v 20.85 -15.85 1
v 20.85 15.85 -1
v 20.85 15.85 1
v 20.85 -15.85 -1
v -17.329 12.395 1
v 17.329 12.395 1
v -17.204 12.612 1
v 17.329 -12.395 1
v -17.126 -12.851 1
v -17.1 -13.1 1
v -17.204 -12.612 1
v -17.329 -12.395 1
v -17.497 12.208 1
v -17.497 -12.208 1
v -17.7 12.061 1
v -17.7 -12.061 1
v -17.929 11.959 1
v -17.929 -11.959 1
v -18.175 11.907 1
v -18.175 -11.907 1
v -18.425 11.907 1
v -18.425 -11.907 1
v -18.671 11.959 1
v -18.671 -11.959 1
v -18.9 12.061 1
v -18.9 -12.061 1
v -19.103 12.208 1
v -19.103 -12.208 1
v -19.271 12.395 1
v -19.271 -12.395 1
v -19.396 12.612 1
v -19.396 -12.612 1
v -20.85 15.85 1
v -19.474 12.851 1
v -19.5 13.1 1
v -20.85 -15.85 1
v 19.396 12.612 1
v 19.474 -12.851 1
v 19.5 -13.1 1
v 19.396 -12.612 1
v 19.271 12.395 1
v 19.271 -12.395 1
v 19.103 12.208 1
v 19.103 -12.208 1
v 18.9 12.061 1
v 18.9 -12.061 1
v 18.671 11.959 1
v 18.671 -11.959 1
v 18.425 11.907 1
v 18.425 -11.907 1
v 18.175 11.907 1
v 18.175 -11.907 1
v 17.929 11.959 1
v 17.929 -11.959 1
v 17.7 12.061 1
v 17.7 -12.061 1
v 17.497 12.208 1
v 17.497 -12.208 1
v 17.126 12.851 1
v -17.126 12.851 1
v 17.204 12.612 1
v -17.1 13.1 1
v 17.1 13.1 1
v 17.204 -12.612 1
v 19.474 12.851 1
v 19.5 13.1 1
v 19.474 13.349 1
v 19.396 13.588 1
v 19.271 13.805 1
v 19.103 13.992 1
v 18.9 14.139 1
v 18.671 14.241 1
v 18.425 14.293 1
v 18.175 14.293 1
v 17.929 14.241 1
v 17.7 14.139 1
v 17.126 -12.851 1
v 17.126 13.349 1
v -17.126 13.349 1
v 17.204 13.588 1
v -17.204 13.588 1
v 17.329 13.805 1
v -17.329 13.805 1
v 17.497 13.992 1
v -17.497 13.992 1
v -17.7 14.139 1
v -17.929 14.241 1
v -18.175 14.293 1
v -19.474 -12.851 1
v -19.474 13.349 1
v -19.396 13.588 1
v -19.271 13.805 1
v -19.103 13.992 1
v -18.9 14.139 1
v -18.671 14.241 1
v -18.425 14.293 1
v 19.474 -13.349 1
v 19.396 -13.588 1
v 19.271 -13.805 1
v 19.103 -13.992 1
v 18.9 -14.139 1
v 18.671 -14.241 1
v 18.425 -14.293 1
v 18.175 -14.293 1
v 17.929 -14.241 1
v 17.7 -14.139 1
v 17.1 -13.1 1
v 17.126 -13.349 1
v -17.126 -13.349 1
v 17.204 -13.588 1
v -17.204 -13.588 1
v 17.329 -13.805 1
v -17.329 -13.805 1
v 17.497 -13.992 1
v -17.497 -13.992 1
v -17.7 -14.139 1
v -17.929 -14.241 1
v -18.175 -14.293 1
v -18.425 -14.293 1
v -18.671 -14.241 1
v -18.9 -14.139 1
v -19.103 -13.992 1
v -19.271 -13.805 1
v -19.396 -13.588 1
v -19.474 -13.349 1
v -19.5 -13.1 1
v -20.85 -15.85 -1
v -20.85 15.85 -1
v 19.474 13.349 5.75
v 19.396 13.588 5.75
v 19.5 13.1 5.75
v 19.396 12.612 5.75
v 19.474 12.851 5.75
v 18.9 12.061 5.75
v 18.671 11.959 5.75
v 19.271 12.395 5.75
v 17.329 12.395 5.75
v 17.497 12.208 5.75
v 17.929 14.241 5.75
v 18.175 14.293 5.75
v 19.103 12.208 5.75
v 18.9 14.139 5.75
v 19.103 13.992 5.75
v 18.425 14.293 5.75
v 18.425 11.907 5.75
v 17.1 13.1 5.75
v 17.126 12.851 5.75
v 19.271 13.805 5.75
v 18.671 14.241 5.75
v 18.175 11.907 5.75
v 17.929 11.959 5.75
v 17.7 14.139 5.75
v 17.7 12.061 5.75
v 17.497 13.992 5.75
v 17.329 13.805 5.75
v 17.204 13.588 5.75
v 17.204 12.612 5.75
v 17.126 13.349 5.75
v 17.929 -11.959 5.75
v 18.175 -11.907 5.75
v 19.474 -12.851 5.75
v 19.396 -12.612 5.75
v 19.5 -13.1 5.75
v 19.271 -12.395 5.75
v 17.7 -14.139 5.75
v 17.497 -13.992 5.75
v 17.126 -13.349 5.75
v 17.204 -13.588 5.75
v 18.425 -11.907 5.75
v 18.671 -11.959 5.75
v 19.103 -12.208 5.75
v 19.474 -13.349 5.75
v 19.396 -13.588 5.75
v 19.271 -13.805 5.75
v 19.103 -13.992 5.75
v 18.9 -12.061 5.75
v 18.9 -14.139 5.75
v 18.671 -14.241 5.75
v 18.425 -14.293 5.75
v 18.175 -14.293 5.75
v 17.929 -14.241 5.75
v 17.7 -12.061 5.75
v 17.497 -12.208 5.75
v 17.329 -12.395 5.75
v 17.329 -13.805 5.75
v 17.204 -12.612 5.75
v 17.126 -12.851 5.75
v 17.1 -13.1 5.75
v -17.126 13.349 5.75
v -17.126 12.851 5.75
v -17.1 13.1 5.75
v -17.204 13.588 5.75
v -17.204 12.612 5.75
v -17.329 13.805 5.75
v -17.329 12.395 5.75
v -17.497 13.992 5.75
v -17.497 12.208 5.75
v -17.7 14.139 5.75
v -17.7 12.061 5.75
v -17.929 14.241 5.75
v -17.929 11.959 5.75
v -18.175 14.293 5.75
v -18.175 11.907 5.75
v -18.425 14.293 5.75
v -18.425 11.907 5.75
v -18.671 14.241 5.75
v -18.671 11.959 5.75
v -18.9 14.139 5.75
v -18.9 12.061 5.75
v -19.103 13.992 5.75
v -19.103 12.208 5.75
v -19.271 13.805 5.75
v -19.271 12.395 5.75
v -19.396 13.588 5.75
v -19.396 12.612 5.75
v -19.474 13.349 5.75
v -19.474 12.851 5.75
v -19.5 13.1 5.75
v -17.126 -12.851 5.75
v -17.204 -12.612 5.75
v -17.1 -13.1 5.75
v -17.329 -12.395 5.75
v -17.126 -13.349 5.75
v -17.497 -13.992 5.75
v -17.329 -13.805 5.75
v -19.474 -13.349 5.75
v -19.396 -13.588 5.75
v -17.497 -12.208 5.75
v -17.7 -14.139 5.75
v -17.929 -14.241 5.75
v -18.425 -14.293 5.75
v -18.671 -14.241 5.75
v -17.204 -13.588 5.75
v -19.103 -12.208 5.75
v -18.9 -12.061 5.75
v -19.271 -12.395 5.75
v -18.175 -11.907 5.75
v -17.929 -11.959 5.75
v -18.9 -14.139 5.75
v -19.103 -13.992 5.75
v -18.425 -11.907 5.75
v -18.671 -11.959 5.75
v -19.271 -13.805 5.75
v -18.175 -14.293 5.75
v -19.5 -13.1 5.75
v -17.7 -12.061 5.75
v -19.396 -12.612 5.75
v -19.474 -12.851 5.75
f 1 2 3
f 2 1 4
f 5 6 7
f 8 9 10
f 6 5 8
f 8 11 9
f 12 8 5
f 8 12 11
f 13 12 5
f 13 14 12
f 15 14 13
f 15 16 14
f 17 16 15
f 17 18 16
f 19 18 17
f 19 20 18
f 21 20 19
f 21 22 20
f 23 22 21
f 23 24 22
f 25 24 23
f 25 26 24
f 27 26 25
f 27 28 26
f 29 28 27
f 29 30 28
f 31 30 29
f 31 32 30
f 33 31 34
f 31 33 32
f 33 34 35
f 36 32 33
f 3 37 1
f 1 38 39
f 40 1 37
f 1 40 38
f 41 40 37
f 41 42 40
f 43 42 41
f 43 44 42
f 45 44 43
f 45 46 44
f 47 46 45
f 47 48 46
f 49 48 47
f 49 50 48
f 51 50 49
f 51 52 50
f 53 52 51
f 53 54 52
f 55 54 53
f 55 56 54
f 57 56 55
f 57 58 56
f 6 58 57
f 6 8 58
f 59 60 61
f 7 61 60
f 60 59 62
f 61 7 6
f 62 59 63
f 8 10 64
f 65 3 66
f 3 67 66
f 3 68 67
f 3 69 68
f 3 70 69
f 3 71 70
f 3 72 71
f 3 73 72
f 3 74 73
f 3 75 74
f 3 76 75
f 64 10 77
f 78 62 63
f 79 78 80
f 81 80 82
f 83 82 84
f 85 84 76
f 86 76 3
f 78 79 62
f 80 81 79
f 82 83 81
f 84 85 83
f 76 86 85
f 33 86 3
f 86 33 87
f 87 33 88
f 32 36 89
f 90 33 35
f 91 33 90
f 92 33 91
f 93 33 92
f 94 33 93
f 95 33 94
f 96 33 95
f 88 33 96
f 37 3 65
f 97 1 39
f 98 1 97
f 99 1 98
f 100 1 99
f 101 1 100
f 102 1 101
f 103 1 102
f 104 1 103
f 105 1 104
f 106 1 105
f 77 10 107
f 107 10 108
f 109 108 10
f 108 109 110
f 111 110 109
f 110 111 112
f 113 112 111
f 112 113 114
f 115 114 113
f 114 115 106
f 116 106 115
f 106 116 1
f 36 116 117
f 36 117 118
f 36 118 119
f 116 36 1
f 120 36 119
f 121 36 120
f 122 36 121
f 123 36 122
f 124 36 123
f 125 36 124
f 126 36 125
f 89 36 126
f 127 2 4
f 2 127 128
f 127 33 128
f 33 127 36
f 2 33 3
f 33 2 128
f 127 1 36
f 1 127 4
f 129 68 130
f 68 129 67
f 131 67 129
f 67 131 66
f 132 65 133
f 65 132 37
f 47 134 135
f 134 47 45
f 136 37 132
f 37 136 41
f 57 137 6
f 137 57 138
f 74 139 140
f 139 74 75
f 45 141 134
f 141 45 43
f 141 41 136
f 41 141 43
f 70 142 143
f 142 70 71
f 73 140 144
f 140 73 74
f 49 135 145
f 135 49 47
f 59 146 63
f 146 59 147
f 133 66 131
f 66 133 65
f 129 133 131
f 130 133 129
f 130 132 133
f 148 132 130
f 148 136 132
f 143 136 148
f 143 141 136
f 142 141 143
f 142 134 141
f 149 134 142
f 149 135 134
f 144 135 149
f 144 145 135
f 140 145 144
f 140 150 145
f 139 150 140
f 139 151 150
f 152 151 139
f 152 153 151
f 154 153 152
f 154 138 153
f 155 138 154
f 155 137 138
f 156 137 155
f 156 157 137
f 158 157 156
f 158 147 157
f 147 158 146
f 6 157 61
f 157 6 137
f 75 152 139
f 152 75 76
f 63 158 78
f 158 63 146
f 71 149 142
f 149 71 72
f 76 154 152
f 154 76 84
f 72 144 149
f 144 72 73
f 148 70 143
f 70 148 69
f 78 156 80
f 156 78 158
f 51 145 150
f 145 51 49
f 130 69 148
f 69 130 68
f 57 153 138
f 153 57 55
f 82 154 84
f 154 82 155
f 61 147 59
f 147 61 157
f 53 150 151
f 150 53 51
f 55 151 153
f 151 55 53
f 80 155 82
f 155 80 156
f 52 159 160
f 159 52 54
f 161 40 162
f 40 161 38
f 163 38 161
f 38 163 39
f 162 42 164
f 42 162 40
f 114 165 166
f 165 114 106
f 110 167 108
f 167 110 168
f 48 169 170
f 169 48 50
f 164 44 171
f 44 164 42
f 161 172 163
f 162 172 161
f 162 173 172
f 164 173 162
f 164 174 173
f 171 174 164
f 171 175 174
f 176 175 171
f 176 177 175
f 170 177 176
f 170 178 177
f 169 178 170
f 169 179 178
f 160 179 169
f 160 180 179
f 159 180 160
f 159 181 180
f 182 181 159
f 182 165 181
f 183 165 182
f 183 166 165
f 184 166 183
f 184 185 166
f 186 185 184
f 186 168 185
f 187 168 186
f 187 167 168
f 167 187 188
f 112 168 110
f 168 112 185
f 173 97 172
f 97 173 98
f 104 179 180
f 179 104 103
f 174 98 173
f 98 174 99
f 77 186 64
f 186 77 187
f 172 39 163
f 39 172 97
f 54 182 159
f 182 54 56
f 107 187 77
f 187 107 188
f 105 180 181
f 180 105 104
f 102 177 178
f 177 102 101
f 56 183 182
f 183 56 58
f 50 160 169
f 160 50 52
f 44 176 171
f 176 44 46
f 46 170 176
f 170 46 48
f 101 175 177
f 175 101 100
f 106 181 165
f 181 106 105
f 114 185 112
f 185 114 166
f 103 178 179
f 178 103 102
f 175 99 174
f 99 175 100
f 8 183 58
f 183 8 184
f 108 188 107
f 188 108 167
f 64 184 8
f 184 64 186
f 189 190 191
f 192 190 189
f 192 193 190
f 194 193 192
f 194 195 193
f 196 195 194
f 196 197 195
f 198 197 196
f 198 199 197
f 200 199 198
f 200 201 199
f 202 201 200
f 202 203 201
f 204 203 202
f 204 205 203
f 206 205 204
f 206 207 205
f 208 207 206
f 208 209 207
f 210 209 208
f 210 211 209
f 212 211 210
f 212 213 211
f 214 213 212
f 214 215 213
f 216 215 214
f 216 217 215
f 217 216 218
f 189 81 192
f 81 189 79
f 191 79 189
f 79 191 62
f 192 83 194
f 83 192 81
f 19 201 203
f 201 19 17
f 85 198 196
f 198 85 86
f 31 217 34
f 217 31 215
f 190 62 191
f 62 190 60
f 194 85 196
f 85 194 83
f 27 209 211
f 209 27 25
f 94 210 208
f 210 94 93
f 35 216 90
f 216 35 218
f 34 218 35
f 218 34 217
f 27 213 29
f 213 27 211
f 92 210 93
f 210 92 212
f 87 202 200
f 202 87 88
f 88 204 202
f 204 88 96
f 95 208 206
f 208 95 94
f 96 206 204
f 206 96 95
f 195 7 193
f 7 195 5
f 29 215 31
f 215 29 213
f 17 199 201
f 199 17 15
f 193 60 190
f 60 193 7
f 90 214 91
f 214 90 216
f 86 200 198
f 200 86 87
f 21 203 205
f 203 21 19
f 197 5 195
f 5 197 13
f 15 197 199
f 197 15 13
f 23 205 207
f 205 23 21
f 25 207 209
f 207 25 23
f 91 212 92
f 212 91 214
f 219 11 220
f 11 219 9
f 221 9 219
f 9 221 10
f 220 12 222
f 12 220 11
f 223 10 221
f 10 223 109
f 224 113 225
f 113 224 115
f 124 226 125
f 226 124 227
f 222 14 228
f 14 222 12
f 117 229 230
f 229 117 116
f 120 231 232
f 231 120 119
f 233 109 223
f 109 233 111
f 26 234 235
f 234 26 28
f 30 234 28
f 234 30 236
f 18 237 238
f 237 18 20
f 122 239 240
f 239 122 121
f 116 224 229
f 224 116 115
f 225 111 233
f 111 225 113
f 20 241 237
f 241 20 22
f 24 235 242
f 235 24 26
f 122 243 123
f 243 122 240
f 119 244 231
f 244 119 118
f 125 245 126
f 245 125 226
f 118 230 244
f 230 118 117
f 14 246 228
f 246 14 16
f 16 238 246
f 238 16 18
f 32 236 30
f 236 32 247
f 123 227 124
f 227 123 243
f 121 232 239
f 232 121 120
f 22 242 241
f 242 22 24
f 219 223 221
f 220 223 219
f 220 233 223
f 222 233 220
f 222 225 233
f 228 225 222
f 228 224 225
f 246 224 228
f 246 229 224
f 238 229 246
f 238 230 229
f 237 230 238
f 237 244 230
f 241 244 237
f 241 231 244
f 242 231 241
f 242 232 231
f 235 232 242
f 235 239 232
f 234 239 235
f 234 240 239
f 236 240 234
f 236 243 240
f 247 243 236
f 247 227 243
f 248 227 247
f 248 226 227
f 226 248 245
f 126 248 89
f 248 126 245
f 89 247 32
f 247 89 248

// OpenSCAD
$fn=30;

cube([41.7, 31.7, 2], center=true);

translate([18.3, 13.1, 3]) {
    cylinder(5.5, 1.2, 1.2, center=true);
}
        
translate([18.3, -13.1, 3]) {
    cylinder(5.5, 1.2, 1.2, center=true);
}
            
translate([-18.3, 13.1, 3]) {
    cylinder(5.5, 1.2, 1.2, center=true);
}

translate([-18.3, -13.1, 3]) {
    cylinder(5.5, 1.2, 1.2, center=true);
}
